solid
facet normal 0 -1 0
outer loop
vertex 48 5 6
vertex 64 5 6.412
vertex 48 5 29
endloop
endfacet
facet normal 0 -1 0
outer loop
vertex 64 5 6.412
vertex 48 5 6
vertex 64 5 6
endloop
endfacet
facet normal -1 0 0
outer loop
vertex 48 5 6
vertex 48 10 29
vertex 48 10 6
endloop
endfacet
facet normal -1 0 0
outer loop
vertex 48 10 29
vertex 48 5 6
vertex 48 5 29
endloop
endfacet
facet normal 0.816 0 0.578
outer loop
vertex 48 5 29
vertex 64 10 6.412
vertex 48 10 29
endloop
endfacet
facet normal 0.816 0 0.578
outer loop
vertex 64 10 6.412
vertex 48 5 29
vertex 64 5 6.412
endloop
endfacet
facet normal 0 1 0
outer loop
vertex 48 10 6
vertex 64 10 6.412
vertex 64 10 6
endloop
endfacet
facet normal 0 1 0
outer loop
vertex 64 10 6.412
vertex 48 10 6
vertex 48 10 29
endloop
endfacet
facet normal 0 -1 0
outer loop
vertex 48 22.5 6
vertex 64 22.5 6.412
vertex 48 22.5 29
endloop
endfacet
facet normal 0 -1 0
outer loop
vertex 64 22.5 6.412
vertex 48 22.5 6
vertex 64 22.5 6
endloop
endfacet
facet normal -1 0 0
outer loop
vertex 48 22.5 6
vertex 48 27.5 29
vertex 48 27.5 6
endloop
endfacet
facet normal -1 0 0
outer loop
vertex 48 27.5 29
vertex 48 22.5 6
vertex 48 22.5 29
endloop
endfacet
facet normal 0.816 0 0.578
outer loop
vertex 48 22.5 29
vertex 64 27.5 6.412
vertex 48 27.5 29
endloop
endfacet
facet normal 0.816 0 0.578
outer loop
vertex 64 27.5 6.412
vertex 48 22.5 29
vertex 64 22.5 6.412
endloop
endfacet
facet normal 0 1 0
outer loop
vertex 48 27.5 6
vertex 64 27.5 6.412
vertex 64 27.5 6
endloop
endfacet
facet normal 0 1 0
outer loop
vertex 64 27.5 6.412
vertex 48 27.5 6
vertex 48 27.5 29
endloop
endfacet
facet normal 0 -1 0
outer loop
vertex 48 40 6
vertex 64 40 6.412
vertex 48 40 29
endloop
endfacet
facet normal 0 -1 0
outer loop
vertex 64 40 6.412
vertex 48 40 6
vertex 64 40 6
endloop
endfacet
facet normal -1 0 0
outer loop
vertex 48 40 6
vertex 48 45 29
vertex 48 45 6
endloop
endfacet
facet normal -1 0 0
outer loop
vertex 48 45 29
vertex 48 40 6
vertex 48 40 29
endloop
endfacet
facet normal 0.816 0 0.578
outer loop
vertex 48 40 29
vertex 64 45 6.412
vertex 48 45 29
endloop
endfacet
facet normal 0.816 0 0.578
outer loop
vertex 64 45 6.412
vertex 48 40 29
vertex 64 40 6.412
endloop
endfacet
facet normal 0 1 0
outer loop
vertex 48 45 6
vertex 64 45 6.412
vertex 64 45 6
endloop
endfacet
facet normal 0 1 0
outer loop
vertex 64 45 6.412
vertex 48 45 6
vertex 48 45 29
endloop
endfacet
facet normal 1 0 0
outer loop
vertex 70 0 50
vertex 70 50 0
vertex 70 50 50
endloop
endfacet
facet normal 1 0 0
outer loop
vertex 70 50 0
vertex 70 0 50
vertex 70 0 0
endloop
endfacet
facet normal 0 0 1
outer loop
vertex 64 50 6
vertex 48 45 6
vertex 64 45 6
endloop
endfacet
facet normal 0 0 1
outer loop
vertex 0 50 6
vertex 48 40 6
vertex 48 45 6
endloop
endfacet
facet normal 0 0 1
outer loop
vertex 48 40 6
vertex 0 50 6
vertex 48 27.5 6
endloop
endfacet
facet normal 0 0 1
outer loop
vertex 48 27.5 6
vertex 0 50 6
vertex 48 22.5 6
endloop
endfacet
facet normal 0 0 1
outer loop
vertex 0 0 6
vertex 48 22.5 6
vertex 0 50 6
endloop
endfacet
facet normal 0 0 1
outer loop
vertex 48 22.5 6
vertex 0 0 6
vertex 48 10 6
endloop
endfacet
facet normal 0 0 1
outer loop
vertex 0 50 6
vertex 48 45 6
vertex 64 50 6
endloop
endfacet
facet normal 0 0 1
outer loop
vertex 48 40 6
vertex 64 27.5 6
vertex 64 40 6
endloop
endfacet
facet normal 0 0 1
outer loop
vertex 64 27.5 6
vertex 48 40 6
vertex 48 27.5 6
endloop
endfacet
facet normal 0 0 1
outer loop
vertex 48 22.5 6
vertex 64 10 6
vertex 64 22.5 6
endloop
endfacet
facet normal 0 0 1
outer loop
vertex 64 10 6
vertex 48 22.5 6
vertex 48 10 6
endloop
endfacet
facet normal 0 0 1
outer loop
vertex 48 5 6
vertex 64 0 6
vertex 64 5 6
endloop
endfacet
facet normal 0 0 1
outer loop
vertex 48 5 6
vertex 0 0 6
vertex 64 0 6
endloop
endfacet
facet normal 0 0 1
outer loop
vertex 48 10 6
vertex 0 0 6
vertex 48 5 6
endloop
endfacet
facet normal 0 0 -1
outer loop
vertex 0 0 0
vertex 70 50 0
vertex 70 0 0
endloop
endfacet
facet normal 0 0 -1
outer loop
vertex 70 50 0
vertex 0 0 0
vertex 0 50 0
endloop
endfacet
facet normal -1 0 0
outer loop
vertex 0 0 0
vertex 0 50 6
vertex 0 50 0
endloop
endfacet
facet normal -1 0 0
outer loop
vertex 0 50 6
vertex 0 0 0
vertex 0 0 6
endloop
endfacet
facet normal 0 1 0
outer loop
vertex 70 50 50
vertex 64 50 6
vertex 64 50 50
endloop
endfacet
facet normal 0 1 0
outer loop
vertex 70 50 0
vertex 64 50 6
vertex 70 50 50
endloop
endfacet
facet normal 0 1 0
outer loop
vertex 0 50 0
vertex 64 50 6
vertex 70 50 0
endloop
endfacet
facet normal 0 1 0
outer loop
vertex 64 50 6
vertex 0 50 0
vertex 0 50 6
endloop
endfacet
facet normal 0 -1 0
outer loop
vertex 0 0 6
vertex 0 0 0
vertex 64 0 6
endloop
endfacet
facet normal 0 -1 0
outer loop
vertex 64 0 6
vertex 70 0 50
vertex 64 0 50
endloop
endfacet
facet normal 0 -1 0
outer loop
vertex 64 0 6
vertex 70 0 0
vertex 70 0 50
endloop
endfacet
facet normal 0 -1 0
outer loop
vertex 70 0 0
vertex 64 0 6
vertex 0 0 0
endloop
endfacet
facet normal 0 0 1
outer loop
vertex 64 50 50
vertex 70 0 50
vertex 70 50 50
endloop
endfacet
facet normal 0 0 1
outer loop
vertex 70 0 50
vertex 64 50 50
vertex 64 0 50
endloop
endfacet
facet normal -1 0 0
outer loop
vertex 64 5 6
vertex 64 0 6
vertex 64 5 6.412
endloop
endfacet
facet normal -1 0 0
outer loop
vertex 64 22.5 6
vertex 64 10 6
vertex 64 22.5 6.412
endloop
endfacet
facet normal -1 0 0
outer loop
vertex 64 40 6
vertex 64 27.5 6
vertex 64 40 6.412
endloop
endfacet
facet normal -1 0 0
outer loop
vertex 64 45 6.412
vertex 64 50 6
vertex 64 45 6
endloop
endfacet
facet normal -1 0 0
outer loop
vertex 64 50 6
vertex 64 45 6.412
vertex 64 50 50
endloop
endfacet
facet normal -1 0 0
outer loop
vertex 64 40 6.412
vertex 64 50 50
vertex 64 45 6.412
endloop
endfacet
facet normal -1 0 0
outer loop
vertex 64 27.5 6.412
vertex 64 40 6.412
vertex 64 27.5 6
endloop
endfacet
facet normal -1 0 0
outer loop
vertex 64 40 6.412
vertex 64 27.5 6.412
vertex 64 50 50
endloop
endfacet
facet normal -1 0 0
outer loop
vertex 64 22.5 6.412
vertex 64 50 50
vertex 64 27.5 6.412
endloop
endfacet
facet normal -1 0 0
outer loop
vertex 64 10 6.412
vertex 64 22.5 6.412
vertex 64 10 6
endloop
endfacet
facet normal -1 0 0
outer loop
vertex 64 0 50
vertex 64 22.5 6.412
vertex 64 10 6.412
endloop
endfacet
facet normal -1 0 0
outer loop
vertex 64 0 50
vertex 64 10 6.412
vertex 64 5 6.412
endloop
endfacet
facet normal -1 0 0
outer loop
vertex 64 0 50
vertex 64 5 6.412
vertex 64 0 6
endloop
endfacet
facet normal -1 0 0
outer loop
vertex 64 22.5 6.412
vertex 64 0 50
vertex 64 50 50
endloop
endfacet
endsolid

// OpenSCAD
$fn = 32;

// ----------------------------------------------------------------------
// Rib bracket: 3-gusset L bracket
// ----------------------------------------------------------------------

// --- parameters (mm) ---
base_l = 70;              // foot length, X
base_w = 50;              // foot width, Y
base_t = 6;               // foot thickness
plate_t = 6;              // upright plate thickness
plate_h = 50;             // overall height
gus_l = 16;               // gusset leg along the foot
gus_h = 24;               // gusset height
gus_t = 5;                // gusset thickness
gus_edge = 5;             // gusset margin from the foot edge
n_gus = 3;                // gusset count

gus_pitch = (base_w - 2 * gus_edge - gus_t) / (n_gus - 1);  // gusset pitch

union() {
  cube([base_l, base_w, base_t]);
  translate([base_l - plate_t, 0, base_t - 1])
    cube([plate_t, base_w, plate_h - base_t + 1]);
  for (i = [0 : n_gus - 1])
    translate([base_l - plate_t - gus_l, gus_edge + i * gus_pitch, base_t - 1])
      rotate([-90, 0, 0])
        linear_extrude(height = gus_t)
          polygon(points = [[0, 0], [gus_l + 1, 0], [0, -gus_h]]);
}
